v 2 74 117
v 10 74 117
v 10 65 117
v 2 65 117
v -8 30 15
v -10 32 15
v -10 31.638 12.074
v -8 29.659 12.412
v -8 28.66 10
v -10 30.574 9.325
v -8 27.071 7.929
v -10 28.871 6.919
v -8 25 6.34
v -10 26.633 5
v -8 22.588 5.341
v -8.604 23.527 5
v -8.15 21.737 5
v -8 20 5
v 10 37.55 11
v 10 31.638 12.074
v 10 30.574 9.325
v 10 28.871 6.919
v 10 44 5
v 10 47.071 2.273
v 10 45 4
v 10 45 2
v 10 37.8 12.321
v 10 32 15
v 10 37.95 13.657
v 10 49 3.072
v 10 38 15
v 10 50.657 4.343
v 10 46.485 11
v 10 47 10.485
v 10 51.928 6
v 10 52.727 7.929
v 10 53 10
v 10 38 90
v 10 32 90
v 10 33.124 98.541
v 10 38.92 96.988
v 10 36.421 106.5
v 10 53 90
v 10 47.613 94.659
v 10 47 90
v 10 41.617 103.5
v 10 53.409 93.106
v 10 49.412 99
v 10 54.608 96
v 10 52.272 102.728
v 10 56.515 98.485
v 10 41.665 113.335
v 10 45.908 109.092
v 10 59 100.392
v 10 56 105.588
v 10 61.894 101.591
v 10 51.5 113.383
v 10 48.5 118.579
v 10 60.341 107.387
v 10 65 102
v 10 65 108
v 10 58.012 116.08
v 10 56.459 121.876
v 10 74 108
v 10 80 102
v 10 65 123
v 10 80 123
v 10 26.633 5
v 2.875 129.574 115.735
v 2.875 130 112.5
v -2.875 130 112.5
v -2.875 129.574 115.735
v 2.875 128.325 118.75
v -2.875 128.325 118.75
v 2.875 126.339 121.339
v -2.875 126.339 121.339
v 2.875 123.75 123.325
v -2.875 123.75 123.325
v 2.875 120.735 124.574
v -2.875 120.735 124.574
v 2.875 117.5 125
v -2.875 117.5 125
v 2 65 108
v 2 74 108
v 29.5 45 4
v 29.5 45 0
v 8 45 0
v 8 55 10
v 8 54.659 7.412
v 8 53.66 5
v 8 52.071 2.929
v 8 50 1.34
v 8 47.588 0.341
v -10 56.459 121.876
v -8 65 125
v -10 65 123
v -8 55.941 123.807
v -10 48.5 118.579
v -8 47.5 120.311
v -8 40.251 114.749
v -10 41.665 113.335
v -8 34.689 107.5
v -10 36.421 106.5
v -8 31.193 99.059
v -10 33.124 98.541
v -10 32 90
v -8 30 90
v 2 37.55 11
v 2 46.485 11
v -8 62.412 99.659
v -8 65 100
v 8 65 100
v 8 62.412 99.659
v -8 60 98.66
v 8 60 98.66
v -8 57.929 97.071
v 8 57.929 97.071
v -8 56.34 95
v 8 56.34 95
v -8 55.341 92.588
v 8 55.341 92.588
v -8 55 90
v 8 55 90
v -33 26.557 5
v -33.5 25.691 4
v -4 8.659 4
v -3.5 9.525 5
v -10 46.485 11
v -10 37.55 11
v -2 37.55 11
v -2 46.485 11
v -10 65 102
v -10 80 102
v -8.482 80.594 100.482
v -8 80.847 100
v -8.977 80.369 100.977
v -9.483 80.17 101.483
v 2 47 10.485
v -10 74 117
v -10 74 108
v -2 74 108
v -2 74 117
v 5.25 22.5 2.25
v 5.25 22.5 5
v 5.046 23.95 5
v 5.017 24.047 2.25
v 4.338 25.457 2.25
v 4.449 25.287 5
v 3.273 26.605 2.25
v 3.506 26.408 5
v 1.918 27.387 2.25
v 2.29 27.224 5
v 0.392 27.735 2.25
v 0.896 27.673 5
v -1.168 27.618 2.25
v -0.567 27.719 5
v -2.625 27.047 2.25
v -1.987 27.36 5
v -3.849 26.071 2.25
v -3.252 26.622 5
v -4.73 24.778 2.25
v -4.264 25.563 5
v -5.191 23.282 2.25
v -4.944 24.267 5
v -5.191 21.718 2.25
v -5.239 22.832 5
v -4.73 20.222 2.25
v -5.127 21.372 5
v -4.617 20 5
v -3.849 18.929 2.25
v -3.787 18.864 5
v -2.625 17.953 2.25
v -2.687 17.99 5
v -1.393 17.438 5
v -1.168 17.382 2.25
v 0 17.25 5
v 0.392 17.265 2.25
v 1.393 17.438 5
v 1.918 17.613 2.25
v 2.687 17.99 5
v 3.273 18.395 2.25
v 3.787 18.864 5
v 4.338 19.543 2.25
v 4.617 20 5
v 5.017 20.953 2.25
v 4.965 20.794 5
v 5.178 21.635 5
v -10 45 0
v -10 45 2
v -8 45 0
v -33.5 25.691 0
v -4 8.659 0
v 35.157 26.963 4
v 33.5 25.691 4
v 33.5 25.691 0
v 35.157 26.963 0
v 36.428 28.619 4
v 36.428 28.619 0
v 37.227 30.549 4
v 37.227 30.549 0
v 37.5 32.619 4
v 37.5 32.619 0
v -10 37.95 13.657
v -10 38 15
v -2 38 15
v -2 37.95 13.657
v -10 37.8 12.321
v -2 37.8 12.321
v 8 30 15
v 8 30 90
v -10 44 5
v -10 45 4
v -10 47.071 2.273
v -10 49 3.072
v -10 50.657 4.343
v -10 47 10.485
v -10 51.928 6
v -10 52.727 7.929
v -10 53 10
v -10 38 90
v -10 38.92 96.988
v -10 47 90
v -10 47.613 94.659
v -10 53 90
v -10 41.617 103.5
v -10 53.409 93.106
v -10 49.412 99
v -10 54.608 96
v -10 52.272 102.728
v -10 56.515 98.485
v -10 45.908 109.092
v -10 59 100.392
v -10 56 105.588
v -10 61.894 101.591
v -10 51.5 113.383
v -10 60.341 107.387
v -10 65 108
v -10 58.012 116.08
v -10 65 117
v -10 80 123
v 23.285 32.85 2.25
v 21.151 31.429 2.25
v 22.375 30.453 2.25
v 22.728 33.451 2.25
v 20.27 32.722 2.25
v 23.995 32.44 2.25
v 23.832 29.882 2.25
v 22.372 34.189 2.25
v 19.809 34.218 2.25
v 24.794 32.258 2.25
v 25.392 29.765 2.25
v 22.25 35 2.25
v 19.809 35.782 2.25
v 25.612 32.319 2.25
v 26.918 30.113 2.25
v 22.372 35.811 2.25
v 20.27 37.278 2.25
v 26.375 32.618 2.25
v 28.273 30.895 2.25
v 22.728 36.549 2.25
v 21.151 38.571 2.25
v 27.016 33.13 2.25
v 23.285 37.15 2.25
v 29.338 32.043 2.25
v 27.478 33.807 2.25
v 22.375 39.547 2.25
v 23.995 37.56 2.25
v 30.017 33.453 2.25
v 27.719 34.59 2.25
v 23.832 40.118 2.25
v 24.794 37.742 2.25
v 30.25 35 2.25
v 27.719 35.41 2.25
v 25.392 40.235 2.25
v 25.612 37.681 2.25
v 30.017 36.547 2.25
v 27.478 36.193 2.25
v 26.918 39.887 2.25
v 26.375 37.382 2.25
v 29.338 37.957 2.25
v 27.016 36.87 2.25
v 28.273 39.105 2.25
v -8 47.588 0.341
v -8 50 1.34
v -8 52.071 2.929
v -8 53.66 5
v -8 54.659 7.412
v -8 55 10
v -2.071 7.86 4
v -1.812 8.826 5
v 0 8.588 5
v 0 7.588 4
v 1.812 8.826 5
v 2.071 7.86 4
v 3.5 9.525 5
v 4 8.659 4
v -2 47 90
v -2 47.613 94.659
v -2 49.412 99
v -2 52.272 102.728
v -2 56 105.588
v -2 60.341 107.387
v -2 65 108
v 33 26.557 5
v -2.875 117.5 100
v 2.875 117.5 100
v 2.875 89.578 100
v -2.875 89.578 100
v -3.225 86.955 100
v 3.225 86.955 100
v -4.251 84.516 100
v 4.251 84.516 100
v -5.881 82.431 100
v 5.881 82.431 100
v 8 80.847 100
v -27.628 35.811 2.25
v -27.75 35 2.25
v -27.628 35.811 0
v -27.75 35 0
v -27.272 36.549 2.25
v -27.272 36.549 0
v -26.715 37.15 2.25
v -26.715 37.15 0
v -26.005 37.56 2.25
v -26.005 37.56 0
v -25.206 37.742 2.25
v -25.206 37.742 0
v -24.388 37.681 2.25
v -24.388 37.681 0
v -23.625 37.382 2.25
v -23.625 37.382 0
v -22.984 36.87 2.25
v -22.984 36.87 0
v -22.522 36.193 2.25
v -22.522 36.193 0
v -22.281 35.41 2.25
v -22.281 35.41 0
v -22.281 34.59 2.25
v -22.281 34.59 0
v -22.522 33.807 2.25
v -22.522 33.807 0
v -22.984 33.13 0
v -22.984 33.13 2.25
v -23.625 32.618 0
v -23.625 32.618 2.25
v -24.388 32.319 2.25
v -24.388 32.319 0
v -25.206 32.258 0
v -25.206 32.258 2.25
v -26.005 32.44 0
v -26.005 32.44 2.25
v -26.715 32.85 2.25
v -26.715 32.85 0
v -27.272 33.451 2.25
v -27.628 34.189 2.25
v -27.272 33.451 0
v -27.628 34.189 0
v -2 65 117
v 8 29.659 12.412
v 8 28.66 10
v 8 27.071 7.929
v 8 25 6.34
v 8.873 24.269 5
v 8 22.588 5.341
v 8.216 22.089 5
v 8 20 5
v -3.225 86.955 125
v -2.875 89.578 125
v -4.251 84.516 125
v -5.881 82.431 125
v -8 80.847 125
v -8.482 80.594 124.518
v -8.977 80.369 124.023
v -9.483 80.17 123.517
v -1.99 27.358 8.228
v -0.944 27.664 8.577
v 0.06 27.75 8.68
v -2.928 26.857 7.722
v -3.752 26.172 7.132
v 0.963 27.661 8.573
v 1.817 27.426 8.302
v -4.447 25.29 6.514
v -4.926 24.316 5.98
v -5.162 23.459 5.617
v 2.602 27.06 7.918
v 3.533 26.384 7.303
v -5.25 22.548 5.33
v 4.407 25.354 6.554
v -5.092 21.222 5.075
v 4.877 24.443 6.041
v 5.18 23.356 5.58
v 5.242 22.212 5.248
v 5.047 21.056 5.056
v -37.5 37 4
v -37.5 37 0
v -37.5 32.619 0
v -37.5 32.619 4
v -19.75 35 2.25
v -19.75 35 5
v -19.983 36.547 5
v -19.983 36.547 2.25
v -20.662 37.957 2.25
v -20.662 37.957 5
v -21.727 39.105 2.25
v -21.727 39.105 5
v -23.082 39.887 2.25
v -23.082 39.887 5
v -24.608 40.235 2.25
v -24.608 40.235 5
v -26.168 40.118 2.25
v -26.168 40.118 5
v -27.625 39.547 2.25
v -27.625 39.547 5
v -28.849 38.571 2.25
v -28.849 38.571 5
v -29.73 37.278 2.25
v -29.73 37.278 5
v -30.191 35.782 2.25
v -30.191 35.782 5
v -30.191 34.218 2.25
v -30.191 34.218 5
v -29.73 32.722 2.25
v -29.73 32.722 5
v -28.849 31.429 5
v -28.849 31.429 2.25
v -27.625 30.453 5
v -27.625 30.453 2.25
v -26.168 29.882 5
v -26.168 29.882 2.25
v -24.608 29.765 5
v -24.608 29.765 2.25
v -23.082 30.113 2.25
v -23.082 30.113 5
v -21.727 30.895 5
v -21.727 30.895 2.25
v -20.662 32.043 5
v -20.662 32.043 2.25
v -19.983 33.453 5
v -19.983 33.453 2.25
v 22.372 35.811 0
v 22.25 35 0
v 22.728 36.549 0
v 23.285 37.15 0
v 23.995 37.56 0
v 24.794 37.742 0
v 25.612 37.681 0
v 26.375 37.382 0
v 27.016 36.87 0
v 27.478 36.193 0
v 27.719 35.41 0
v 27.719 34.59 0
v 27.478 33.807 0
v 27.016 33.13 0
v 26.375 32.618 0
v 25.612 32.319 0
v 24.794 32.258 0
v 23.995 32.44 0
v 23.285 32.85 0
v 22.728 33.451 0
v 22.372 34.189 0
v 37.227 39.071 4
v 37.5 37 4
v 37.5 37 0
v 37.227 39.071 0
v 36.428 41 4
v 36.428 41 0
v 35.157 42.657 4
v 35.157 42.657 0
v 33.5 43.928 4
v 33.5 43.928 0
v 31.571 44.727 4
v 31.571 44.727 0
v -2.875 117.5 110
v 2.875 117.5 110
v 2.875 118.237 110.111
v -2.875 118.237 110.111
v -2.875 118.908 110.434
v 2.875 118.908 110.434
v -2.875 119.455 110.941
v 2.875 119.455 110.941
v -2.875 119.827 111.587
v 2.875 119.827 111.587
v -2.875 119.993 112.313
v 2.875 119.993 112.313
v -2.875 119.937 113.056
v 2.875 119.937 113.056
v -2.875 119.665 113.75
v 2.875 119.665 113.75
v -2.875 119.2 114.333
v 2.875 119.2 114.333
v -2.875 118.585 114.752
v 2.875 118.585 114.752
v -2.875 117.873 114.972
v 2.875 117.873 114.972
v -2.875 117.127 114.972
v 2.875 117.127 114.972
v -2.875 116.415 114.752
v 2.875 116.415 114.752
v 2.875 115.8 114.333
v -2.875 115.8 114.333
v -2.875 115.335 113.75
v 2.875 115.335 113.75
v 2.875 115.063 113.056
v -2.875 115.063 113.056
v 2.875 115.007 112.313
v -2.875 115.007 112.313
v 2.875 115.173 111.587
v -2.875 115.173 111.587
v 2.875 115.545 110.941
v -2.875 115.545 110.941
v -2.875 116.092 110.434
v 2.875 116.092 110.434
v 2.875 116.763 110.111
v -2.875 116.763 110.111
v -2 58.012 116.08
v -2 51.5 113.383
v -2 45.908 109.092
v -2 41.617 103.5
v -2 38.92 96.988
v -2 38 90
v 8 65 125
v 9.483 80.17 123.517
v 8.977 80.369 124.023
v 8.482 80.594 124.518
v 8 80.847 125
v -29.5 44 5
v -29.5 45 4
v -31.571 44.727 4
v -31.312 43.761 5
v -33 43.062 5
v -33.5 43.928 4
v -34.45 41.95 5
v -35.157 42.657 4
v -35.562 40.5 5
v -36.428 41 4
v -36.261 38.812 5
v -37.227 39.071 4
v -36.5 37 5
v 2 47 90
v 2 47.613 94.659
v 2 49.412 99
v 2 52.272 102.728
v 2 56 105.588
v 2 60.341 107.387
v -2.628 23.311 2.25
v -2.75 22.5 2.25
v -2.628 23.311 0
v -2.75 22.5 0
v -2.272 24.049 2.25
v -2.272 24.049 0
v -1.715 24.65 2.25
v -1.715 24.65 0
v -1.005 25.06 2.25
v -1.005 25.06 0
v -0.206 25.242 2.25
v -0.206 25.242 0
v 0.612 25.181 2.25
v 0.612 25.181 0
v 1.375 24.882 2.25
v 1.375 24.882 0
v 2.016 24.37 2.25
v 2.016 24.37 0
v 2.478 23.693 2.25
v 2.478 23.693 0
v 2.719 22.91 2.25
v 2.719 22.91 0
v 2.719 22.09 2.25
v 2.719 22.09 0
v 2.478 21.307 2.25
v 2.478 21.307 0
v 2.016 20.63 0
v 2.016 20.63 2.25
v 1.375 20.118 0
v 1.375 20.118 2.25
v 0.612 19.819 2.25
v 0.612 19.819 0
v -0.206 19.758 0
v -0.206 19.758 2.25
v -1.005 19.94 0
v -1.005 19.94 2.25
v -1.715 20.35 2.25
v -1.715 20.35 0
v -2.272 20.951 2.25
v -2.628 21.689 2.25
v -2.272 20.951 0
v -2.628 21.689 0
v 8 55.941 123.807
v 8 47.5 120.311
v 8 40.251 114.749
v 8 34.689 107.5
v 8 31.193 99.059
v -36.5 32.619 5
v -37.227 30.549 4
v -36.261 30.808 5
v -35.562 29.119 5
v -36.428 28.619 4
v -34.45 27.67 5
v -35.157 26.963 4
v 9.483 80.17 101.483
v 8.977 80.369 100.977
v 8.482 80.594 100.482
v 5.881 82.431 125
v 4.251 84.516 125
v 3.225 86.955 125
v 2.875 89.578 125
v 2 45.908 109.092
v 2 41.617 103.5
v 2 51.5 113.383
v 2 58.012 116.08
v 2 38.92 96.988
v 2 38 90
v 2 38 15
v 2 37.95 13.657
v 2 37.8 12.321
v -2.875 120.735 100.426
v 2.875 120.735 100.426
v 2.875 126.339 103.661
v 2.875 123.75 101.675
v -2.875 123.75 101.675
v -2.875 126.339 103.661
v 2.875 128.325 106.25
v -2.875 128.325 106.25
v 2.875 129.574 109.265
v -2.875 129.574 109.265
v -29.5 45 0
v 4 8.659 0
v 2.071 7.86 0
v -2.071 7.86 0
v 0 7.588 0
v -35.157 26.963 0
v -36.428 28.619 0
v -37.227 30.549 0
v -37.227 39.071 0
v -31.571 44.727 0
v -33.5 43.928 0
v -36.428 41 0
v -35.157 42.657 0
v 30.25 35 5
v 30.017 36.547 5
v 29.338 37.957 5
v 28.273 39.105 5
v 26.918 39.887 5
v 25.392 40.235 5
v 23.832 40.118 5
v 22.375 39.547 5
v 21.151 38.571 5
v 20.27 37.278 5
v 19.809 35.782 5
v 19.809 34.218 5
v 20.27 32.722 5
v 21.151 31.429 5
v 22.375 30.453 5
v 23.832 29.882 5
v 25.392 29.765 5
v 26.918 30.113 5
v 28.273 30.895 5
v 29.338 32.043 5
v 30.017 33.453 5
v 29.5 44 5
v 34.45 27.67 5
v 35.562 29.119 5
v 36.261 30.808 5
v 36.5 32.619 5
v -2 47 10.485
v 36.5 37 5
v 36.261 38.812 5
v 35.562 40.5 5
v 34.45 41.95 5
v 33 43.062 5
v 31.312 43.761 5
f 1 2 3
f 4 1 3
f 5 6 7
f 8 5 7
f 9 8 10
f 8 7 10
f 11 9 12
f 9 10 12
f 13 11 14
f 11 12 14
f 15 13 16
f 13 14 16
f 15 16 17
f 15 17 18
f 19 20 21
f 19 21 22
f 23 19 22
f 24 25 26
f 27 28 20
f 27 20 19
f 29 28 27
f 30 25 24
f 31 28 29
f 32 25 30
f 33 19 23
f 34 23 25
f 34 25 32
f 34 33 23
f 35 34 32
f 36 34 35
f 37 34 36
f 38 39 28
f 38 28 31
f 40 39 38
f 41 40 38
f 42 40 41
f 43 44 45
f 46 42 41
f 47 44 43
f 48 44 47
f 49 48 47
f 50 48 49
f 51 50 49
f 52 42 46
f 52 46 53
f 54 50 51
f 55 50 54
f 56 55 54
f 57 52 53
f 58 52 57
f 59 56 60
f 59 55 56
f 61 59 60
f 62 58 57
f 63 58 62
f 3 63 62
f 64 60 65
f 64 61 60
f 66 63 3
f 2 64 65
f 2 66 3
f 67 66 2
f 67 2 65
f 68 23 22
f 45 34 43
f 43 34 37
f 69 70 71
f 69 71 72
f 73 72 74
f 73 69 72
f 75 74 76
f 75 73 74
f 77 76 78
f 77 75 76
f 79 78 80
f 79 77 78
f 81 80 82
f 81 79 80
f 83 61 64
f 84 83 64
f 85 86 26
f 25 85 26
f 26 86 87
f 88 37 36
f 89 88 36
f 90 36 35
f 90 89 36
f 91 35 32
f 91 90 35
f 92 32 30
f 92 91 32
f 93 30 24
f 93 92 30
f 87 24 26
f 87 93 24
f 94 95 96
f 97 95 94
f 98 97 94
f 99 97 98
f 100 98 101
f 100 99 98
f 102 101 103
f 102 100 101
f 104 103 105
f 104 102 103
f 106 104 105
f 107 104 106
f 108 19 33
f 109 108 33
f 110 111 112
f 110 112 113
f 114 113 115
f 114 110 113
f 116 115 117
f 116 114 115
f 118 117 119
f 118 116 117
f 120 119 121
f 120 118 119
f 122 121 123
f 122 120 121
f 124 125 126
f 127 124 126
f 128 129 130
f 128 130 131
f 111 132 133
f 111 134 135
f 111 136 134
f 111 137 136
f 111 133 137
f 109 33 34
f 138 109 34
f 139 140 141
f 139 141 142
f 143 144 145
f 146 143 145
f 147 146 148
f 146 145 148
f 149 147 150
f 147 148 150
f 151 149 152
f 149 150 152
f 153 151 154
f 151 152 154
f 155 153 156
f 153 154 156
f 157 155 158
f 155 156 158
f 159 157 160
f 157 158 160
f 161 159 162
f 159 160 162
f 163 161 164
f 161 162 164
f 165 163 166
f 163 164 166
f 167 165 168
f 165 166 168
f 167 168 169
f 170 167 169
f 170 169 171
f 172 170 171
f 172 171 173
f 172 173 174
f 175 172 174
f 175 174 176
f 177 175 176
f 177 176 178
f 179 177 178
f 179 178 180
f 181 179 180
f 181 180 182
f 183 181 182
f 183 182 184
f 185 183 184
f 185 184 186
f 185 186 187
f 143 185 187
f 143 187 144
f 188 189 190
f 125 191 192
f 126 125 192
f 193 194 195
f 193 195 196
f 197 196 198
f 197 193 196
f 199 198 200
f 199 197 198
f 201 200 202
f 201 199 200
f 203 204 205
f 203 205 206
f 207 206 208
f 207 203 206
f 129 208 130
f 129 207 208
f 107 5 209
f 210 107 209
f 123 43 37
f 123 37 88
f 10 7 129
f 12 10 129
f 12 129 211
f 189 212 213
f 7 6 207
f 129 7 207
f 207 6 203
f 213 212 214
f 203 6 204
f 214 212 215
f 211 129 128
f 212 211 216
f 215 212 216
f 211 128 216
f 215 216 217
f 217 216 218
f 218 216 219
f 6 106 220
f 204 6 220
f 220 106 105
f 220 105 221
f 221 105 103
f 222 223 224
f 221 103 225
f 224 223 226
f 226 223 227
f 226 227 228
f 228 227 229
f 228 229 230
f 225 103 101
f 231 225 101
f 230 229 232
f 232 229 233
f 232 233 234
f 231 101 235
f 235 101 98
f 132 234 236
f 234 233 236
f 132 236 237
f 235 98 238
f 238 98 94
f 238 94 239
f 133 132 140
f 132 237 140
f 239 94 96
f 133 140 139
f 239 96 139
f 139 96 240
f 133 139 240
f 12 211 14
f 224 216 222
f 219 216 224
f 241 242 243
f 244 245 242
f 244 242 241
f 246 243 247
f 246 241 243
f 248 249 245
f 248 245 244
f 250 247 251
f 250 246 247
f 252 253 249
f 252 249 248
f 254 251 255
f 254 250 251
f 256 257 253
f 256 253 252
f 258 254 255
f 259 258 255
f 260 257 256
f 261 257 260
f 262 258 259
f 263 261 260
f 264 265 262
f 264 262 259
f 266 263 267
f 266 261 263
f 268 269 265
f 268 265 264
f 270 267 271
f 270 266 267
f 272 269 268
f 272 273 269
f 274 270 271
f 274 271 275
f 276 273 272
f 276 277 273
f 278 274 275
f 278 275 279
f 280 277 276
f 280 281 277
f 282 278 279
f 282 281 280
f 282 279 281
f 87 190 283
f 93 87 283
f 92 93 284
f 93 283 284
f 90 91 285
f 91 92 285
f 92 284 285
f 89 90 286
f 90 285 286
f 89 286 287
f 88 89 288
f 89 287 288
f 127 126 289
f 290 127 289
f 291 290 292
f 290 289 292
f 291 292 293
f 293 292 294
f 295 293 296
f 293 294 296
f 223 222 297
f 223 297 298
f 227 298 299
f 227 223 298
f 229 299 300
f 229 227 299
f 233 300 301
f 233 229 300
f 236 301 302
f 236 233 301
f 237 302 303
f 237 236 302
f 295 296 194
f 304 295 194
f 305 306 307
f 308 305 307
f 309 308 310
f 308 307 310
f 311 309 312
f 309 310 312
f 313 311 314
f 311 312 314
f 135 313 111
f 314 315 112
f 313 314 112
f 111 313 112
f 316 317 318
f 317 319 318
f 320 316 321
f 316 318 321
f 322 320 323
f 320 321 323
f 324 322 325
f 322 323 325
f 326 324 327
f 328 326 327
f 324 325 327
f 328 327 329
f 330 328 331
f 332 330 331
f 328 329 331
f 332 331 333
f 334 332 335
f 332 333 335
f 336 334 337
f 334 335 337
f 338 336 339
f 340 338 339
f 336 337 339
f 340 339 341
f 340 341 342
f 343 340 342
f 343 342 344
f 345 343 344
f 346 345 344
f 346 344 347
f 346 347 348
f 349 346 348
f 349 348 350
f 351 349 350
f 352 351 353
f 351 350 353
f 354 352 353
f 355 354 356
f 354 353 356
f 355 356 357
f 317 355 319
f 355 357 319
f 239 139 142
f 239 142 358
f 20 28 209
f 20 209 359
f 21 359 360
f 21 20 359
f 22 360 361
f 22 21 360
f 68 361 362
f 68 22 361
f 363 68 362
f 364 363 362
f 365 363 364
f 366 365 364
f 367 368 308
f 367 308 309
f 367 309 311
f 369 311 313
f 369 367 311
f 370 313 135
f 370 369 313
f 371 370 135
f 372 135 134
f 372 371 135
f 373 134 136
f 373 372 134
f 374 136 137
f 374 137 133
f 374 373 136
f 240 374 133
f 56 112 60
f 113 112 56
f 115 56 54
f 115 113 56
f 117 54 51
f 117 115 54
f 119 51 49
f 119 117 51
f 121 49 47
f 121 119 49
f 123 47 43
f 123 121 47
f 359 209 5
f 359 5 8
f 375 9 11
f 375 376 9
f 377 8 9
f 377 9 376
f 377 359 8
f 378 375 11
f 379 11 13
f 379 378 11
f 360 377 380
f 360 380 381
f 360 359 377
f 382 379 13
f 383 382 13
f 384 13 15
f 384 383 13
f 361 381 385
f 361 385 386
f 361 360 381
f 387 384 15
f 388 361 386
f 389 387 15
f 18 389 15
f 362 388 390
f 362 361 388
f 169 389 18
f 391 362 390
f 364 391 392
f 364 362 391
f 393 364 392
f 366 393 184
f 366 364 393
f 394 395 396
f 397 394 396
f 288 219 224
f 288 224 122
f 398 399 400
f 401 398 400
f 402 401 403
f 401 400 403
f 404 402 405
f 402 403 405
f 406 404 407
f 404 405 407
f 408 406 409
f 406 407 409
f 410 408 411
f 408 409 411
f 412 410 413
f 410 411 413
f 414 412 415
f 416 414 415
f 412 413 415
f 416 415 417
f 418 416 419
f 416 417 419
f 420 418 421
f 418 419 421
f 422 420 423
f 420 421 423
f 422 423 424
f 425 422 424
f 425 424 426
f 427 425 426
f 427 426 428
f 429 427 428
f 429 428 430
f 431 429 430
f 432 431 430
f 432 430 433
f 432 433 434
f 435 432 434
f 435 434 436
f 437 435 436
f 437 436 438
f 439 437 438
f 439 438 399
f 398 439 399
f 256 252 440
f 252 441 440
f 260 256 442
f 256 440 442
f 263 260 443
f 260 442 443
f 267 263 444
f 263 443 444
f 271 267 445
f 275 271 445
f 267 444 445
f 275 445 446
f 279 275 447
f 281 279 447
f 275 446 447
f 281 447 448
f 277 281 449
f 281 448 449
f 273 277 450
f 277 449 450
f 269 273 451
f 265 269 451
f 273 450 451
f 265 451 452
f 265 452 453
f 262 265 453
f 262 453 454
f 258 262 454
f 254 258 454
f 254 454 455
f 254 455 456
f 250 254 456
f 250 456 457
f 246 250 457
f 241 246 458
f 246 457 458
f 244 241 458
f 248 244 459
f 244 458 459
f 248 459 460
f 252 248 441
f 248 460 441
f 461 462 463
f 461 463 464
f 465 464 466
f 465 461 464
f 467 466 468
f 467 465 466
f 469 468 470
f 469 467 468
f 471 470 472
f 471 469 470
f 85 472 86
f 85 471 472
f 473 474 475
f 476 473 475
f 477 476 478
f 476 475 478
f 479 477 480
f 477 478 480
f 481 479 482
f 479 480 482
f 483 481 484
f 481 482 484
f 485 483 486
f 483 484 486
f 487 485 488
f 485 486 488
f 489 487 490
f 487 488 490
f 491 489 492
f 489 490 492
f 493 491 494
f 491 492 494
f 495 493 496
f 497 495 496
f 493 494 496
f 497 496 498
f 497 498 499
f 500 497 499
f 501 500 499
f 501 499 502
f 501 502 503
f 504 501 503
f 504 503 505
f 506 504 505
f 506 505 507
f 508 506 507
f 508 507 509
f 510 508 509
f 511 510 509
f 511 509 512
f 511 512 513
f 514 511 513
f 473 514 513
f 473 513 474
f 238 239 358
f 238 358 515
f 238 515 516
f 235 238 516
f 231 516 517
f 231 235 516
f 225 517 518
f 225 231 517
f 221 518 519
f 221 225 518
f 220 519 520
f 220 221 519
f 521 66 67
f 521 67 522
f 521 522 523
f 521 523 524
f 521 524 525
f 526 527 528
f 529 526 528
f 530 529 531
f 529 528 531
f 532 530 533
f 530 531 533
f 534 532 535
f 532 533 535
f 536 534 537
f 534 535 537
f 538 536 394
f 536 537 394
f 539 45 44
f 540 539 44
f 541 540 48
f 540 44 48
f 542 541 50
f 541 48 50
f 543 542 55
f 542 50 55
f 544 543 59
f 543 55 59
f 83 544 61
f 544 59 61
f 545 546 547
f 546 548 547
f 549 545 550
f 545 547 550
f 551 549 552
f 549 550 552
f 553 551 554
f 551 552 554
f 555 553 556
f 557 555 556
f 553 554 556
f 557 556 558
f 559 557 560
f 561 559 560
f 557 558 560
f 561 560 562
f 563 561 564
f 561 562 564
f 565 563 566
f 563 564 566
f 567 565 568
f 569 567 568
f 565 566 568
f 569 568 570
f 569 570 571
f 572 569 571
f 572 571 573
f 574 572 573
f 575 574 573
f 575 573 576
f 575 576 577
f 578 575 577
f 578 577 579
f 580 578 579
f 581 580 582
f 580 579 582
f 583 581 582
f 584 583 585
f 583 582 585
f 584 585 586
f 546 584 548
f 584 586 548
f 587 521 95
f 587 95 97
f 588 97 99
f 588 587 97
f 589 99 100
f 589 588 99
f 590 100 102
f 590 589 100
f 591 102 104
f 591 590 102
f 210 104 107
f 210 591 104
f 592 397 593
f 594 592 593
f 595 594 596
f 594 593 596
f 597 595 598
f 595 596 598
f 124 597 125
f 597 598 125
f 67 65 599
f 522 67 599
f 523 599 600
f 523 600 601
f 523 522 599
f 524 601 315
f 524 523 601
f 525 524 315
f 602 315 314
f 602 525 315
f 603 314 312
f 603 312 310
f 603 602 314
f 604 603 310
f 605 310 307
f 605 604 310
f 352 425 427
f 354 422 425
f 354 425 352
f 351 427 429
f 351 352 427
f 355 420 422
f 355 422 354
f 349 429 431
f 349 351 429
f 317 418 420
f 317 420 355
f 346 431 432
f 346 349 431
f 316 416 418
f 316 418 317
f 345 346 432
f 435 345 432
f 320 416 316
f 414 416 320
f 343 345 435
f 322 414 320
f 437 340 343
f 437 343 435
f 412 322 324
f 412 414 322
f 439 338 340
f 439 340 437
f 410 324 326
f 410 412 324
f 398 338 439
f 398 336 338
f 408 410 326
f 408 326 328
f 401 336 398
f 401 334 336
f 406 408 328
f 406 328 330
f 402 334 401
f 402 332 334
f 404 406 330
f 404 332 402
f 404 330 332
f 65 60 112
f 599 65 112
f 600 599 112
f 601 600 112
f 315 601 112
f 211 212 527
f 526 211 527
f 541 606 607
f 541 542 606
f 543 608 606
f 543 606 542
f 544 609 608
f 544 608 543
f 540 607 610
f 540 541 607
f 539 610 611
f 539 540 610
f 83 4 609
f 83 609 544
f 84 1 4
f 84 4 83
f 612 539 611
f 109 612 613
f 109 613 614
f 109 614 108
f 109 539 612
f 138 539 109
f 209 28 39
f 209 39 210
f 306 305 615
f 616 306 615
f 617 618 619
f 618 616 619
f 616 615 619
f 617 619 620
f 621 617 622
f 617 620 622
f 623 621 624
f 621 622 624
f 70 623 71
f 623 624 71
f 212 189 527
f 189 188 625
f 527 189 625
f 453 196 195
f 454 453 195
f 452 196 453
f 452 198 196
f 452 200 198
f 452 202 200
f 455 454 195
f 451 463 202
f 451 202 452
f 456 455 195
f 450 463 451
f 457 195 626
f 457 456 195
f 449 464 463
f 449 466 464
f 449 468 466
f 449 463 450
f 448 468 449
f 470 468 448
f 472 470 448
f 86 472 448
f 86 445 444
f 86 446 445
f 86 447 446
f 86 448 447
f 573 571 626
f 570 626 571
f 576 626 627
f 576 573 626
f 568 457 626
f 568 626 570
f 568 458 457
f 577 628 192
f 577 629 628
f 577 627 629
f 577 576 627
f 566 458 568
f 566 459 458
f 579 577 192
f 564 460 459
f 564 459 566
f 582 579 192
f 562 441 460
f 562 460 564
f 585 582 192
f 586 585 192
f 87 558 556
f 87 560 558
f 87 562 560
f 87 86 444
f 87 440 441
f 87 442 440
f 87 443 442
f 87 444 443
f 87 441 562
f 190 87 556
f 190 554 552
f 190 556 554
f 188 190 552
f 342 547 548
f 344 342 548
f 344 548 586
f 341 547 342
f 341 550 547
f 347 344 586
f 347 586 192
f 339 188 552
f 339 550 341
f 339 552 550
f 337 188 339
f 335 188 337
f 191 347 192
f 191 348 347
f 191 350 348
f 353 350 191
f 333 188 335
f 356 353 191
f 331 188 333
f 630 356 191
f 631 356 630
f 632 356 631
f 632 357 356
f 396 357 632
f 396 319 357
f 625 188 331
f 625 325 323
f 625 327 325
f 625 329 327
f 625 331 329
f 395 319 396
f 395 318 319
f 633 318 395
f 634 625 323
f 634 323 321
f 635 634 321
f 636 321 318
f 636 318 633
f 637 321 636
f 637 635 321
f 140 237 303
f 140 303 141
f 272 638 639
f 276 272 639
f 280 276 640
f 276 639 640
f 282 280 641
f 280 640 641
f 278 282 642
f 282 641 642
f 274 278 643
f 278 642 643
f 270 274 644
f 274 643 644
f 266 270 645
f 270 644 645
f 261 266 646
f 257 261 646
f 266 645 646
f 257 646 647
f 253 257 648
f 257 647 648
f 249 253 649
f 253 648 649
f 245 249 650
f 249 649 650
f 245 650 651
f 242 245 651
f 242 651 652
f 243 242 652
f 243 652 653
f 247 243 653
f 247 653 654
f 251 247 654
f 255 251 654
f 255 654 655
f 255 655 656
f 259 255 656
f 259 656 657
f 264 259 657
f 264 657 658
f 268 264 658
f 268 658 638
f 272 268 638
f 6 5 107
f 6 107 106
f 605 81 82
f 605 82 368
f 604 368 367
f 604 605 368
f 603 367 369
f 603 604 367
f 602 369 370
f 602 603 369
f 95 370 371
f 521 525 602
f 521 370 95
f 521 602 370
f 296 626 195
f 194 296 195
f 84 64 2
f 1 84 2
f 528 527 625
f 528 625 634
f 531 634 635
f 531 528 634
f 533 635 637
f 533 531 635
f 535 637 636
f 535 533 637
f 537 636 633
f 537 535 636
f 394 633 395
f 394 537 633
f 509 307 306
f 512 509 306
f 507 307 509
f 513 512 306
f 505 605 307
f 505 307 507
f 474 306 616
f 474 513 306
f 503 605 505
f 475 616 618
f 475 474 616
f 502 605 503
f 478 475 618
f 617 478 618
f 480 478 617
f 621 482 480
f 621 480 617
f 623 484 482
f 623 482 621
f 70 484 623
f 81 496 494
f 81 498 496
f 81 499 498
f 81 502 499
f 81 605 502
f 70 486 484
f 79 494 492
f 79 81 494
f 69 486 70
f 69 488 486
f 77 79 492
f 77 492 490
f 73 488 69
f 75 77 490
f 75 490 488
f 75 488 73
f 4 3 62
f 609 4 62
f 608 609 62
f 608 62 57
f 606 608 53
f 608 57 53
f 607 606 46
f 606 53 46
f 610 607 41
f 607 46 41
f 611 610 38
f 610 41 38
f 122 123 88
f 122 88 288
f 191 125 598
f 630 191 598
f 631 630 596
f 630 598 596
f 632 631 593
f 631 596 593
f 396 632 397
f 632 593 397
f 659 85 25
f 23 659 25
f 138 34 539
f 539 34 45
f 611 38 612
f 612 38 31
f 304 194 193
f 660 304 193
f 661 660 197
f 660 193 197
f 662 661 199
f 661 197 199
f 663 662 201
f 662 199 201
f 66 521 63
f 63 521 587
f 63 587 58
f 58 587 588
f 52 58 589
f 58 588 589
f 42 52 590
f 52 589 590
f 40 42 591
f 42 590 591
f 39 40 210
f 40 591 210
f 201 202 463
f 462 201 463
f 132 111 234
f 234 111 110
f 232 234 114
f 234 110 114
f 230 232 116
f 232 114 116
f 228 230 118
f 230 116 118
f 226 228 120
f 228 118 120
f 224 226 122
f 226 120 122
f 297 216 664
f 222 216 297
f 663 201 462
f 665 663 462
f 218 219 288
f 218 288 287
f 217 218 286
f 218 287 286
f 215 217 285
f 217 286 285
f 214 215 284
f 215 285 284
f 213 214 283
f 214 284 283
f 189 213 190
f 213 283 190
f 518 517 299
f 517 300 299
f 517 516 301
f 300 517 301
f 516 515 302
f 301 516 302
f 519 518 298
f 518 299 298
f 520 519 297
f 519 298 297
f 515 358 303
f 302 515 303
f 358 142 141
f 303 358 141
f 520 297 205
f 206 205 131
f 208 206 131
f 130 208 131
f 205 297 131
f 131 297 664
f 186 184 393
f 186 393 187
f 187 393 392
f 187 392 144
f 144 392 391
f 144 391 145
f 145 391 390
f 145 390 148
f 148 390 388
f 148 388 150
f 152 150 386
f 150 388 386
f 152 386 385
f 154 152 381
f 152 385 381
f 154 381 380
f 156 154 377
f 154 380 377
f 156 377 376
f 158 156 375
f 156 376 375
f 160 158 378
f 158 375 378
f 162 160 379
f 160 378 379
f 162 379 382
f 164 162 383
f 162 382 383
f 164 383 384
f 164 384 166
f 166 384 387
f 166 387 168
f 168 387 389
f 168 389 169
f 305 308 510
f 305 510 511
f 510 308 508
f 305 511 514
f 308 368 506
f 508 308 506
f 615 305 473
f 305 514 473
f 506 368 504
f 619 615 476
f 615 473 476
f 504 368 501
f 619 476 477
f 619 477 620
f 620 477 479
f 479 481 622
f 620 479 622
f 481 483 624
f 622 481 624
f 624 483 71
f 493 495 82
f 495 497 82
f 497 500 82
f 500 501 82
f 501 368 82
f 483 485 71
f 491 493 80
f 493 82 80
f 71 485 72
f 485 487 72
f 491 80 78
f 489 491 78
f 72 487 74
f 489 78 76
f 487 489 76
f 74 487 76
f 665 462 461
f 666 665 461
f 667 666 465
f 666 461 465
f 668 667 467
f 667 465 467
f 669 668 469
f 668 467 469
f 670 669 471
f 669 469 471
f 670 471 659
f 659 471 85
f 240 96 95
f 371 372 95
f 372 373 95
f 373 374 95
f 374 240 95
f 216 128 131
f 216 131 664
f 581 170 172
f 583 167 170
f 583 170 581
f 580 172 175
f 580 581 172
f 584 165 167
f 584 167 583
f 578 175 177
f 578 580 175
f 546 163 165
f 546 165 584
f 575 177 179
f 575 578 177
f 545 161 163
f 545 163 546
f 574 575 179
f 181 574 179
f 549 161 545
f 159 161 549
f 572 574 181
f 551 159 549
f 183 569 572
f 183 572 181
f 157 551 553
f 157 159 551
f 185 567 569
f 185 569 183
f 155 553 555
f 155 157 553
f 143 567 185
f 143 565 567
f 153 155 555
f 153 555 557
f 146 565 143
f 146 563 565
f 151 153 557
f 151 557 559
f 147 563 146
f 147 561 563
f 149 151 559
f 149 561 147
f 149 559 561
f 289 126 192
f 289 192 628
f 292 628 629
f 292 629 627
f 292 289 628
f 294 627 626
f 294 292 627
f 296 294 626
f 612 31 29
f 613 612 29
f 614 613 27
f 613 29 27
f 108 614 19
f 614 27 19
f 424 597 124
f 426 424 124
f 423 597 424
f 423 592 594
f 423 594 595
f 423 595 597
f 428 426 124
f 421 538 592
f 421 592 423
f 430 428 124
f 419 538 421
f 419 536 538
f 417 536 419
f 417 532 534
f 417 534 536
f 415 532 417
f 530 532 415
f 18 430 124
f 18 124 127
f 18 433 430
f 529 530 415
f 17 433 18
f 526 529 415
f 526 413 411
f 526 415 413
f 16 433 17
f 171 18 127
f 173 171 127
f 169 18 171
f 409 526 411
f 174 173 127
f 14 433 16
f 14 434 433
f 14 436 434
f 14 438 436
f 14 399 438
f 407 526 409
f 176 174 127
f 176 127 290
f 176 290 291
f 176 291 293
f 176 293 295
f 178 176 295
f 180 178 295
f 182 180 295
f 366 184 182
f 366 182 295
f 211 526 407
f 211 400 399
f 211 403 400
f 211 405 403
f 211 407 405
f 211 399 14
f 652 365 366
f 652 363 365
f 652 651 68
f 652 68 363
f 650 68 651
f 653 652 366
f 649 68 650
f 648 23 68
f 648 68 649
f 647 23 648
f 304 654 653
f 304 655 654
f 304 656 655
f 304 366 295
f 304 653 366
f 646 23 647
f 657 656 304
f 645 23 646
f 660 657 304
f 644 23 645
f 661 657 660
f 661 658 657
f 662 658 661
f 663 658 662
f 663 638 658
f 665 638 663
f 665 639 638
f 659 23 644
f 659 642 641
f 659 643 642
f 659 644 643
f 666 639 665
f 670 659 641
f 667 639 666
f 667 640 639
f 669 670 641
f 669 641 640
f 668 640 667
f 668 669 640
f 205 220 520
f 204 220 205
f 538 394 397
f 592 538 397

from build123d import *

# Parameters (mm, degrees)
BOSS_EXTRUDE1_DEPTH             = 5
FILLET1_R                       = 8
CBORE_FOR_M5_SBHCS1_D           = 5.5
CBORE_FOR_M5_SBHCS1_DEPTH       = 10
CBORE_FOR_M5_SBHCS1_CBORE_D     = 10.5
CBORE_FOR_M5_SBHCS1_CBORE_DEPTH = 2.75
CBORE_FOR_M5_SBHCS1_TIP         = 1.652366702
SKETCH7_W                       = 20
SKETCH7_H                       = 100
BOSS_EXTRUDE2_DEPTH             = 120
SKETCH8_W                       = 190
SKETCH8_H                       = 150
CUT_EXTRUDE1_DEPTH              = 72
FILLET2_R                       = 12.5
SKETCH9_W                       = 14.25
SKETCH9_H                       = 100
CUT_EXTRUDE2_DEPTH              = 72
SKETCH10_R                      = 2.5
CUT_EXTRUDE3_DEPTH              = 72
FILLET3_R                       = 10
FILLET4_R                       = 10
FILLET5_R                       = 35
FILLET6_R                       = 10
SKETCH12_W                      = 20
SKETCH12_H                      = 10
BOSS_EXTRUDE3_DEPTH             = 5
FILLET7_R                       = 10
CHAMFER1_SIZE                   = 2
CHAMFER2_SIZE                   = 1
CUT_EXTRUDE4_DEPTH              = 8


# Some blends are built 0.0001 mm under size
with BuildPart() as part:
    # Sketch2 → Boss-Extrude1 (new body)
    with BuildSketch(Plane.XY):
        Polygon((-37.5, 28.000635095), (0, 6.35), (37.5, 28.000635095), (37.5, 45), (-37.5, 45), align=None)
    extrude(amount=BOSS_EXTRUDE1_DEPTH)

    # Fillet1
    fillet1_edges = [part.edges().sort_by_distance(p)[0] for p in [
        (37.5, 28.000635095, 2.5),
        (0, 6.35, 2.5),
        (-37.5, 28.000635095, 2.5),
        (-37.5, 45, 2.5),
        (37.5, 45, 2.5),
    ]]
    fillet(fillet1_edges, radius=FILLET1_R)

    # CBORE for M5 SBHCS1
    with Locations(Plane.XY.offset(5)):
        with Locations((-25, 35), (0, 22.5), (25, 35)):
            CounterBoreHole(CBORE_FOR_M5_SBHCS1_D / 2, CBORE_FOR_M5_SBHCS1_CBORE_D / 2, CBORE_FOR_M5_SBHCS1_CBORE_DEPTH, depth=CBORE_FOR_M5_SBHCS1_DEPTH)
            with Locations((0, 0, -(CBORE_FOR_M5_SBHCS1_DEPTH + CBORE_FOR_M5_SBHCS1_TIP / 2))):  # 118° drill point
                Cone(0, CBORE_FOR_M5_SBHCS1_D / 2, CBORE_FOR_M5_SBHCS1_TIP, mode=Mode.SUBTRACT)

    # Sketch7 → Boss-Extrude2 (add)
    with BuildSketch(Plane.XY.offset(5)):
        with Locations((0, 80)):
            Rectangle(SKETCH7_W, SKETCH7_H)
    extrude(amount=BOSS_EXTRUDE2_DEPTH)

    # Sketch8 → Cut-Extrude1 (cut)
    with BuildSketch(Plane(origin=(10, 0, 0), x_dir=(0, 0, -1), z_dir=(1, 0, 0))):
        with Locations((-5, 130)):
            Rectangle(SKETCH8_W, SKETCH8_H)
    extrude(amount=-CUT_EXTRUDE1_DEPTH, mode=Mode.SUBTRACT)

    # Fillet2
    fillet2_edges = [part.edges().sort_by_distance(p)[0] for p in [
        (0, 130, 100),
        (0, 130, 125),
    ]]
    fillet(fillet2_edges, radius=FILLET2_R - 0.0001)  # a hair under: the kernel refuses the full size

    # Sketch9 → Cut-Extrude2 (cut)
    with BuildSketch(Plane.XY.offset(125)):
        with Locations((10, 130)):
            Rectangle(SKETCH9_W, SKETCH9_H)
        with Locations((-10, 130)):
            Rectangle(SKETCH9_W, SKETCH9_H)
    extrude(amount=-CUT_EXTRUDE2_DEPTH, mode=Mode.SUBTRACT)

    # Sketch10 → Cut-Extrude3 (cut)
    with BuildSketch(Plane(origin=(2.875, 0, 0), x_dir=(0, 0, -1), z_dir=(1, 0, 0))):
        with Locations((-112.5, 117.5)):
            Circle(SKETCH10_R)
    extrude(amount=-CUT_EXTRUDE3_DEPTH, mode=Mode.SUBTRACT)

    # Fillet3
    # the kernel refuses this fillet: 10 mm, written as the material it adds along each edge
    with BuildSketch(Plane(origin=(-2.875, 80, 125), x_dir=(-1, 0, 0), z_dir=(0, 0, -1))) as fillet3_piece_1:
        with BuildLine():
            CenterArc((10, 9.577806377), FILLET3_R, 180, 73.291656284)
            Line((0, 9.577806377), (-0.2, 9.577806377))
            Line((-0.2, 9.577806377), (-0.2, 0))
            Line((-0.2, 0), (0, -0.2))
            ThreePointArc((0, -0.2), (3.5625, -0.2), (7.0675, -0.191556128))
            Line((7.0675, -0.191556128), (7.125, 0))
        make_face()
    extrude(amount=25)
    with BuildSketch(Plane(origin=(2.875, 80, 125), x_dir=(0, 1, 0), z_dir=(0, 0, -1))) as fillet3_piece_2:
        with BuildLine():
            CenterArc((9.577806377, 10), FILLET3_R, 196.708343716, 73.291656284)
            Line((0, 7.125), (-0.191556128, 7.0675))
            ThreePointArc((-0.191556128, 7.0675), (-0.2, 3.5625), (-0.2, 0))
            Line((-0.2, 0), (0, -0.2))
            Line((0, -0.2), (9.577806377, -0.2))
            Line((9.577806377, -0.2), (9.577806377, 0))
        make_face()
    extrude(amount=25)

    # Fillet4
    fillet4_edges = [part.edges().sort_by_distance(p)[0] for p in [
        (0, 55, 100),
    ]]
    fillet(fillet4_edges, radius=FILLET4_R)

    # Fillet5
    fillet5_edges = [part.edges().sort_by_distance(p)[0] for p in [
        (0, 30, 125),
    ]]
    fillet(fillet5_edges, radius=FILLET5_R)

    # Fillet6
    # the kernel refuses this fillet: 10 mm, written as the material it adds along each edge
    with BuildSketch(Plane(origin=(10, 30, 5), x_dir=(0, 0, 1), z_dir=(-1, 0, 0))) as fillet6_piece_1_section:
        with BuildLine():
            CenterArc((FILLET6_R, -FILLET6_R), FILLET6_R, 90, 90)
            Line((0, -FILLET6_R), (0, 0))
            Line((0, 0), (FILLET6_R, 0))
        make_face()
    fillet6_piece_1 = extrude(amount=20, mode=Mode.PRIVATE)
    fillet6_piece_1 = fillet6_piece_1 - Plane(origin=(0, 22.5, 7.53044348), x_dir=(1, 0, 0), z_dir=(0, 0, 1)) * Cylinder(5.25, 80, mode=Mode.PRIVATE)
    add(fillet6_piece_1)

    # Sketch12 → Boss-Extrude3 (add)
    with BuildSketch(Plane(origin=(0, 0, 5), x_dir=(-1, 0, 0), z_dir=(0, 0, -1))):
        with Locations((0, 50)):
            Rectangle(SKETCH12_W, SKETCH12_H)
    extrude(amount=BOSS_EXTRUDE3_DEPTH)

    # Fillet7
    # the kernel refuses this fillet: 10 mm, written as the material it takes off along each edge
    with BuildSketch(Plane(origin=(-35, 55, 0), x_dir=(0, 0, 1), z_dir=(1, 0, 0))) as fillet7_piece_1:
        with BuildLine():
            CenterArc((FILLET7_R, FILLET7_R), FILLET7_R, 180, 90)
            Line((0, FILLET7_R), (0, 0))
            Line((0, 0), (FILLET7_R, 0))
        make_face()
    extrude(amount=70, mode=Mode.SUBTRACT)

    # Chamfer1
    # the kernel refuses this chamfer: 2 mm, written as the material it takes off along each edge
    with BuildSketch(Plane(origin=(-10, 65, 100), x_dir=(-0.02749587661058987, 0, 0.9996219169112968), z_dir=(0, 1, 0)), Plane(origin=(10, 85.143365976, 100), x_dir=(0.027495876610586414, 0, 0.9996219169112968), z_dir=(0, -1, 0))) as chamfer1_piece_1:
        Polygon((CHAMFER1_SIZE * 0.999621916911, CHAMFER1_SIZE * 0.0274958766106), (-CHAMFER1_SIZE * 0.0274958766106, CHAMFER1_SIZE * 0.999621916911), (0, 0), align=None)
    extrude(amount=20.143365976, mode=Mode.SUBTRACT)
    with BuildSketch(Plane(origin=(-10, 65, 125), x_dir=(-0.02749587661058987, 0, -0.9996219169112968), z_dir=(0, 1, 0)), Plane(origin=(10, 85.143365976, 125), x_dir=(0.027495876610586414, 0, -0.9996219169112968), z_dir=(0, -1, 0))) as chamfer1_piece_2:
        Polygon((CHAMFER1_SIZE * 0.999621916911, -CHAMFER1_SIZE * 0.0274958766106), (-CHAMFER1_SIZE * 0.0274958766106, -CHAMFER1_SIZE * 0.999621916911), (0, 0), align=None)
    extrude(amount=20.143365976, mode=Mode.SUBTRACT)
    with BuildSketch(Plane(origin=(-10, 55, 10), x_dir=(-0.027495876610589956, -0.9996219169112965, 0), z_dir=(0, 0, 1)), Plane(origin=(10, 55, 90), x_dir=(0.0274958766105822, -0.999621916911297, 0), z_dir=(0, 0, -1))) as chamfer1_piece_3:
        Polygon((CHAMFER1_SIZE * 0.999621916911, CHAMFER1_SIZE * 0.0274958766106), (-CHAMFER1_SIZE * 0.0274958766106, CHAMFER1_SIZE * 0.999621916911), (0, 0), align=None)
    extrude(amount=80, mode=Mode.SUBTRACT)
    with BuildSketch(Plane(origin=(10, 65, 90), x_dir=(0, 0, 1), z_dir=(0, 1, 0))) as chamfer1_piece_4:
        Polygon((10 + CHAMFER1_SIZE, 0), (10, -CHAMFER1_SIZE), (10, 0), align=None)
    revolve(axis=Axis((10, 65, 90), (1, 0, 0)), revolution_arc=90, mode=Mode.SUBTRACT)
    with BuildSketch(Plane(origin=(-10, 65, 90), x_dir=(0, 0, 1), z_dir=(0, 1, 0))) as chamfer1_piece_5:
        Polygon((10 + CHAMFER1_SIZE, 0), (10, CHAMFER1_SIZE), (10, 0), align=None)
    revolve(axis=Axis((-10, 65, 90), (1, 0, 0)), revolution_arc=90, mode=Mode.SUBTRACT)
    with BuildSketch(Plane(origin=(10, 30, 15), x_dir=(0.027495876610581334, 0.999621916911297, 0), z_dir=(0, 0, 1)), Plane(origin=(-10, 30, 15), x_dir=(0.9996219169112968, -0.027495876610585623, 0), z_dir=(0, 0, 1))) as chamfer1_piece_6:
        Polygon((CHAMFER1_SIZE * 0.999621916911, CHAMFER1_SIZE * 0.0274958766106), (-CHAMFER1_SIZE * 0.0274958766106, CHAMFER1_SIZE * 0.999621916911), (0, 0), align=None)
    extrude(amount=75, mode=Mode.SUBTRACT)
    with BuildSketch(Plane(origin=(10, 65, 90), x_dir=(0, 0, 1), z_dir=(0, 1, 0))) as chamfer1_piece_7:
        Polygon((35 - CHAMFER1_SIZE, 0), (35, -CHAMFER1_SIZE), (35, 0), align=None)
    revolve(axis=Axis((10, 65, 90), (1, 0, 0)), revolution_arc=90, mode=Mode.SUBTRACT)
    with BuildSketch(Plane(origin=(-10, 65, 90), x_dir=(0, 0, 1), z_dir=(0, 1, 0))) as chamfer1_piece_8:
        Polygon((35 - CHAMFER1_SIZE, 0), (35, CHAMFER1_SIZE), (35, 0), align=None)
    revolve(axis=Axis((-10, 65, 90), (1, 0, 0)), revolution_arc=90, mode=Mode.SUBTRACT)
    with BuildSketch(Plane(origin=(10, 20, 15), x_dir=(0, 1, 0), z_dir=(0, 0, 1))) as chamfer1_piece_9_section:
        Polygon((10, CHAMFER1_SIZE), (10 + CHAMFER1_SIZE, 0), (10, 0), align=None)
    chamfer1_piece_9 = revolve(axis=Axis((10, 20, 15), (-1, 0, 0)), revolution_arc=119.481154356, mode=Mode.PRIVATE)
    chamfer1_piece_9 = split(chamfer1_piece_9, bisect_by=Plane(origin=(9.27752792, 27.153705444, 5), z_dir=(0, 0, 1)), keep=Keep.TOP, mode=Mode.PRIVATE)
    add(chamfer1_piece_9, mode=Mode.SUBTRACT)
    with BuildSketch(Plane(origin=(-10, 20, 15), x_dir=(0, 1, 0), z_dir=(0, 0, 1))) as chamfer1_piece_10_section:
        Polygon((10, -CHAMFER1_SIZE), (10 + CHAMFER1_SIZE, 0), (10, 0), align=None)
    chamfer1_piece_10 = revolve(axis=Axis((-10, 20, 15), (-1, 0, 0)), revolution_arc=119.481154356, mode=Mode.PRIVATE)
    chamfer1_piece_10 = split(chamfer1_piece_10, bisect_by=Plane(origin=(-9.27752792, 27.153705444, 5), z_dir=(0, 0, 1)), keep=Keep.TOP, mode=Mode.PRIVATE)
    add(chamfer1_piece_10, mode=Mode.SUBTRACT)
    with BuildSketch(Plane(origin=(10, 45, 10), x_dir=(0, 1, 0), z_dir=(0, 0, 1))) as chamfer1_piece_11:
        Polygon((10 - CHAMFER1_SIZE, 0), (10, CHAMFER1_SIZE), (10, 0), align=None)
    revolve(axis=Axis((10, 45, 10), (-1, 0, 0)), revolution_arc=90, mode=Mode.SUBTRACT)
    with BuildSketch(Plane(origin=(-10, 45, 10), x_dir=(0, 1, 0), z_dir=(0, 0, 1))) as chamfer1_piece_12:
        Polygon((10 - CHAMFER1_SIZE, 0), (10, -CHAMFER1_SIZE), (10, 0), align=None)
    revolve(axis=Axis((-10, 45, 10), (-1, 0, 0)), revolution_arc=90, mode=Mode.SUBTRACT)

    # Chamfer2
    chamfer2_edges = [part.edges().sort_by_distance(p)[0] for p in [
        (-37.5, 34.809718624, 5),
        (19.75, 45, 5),
        (37.5, 34.809718624, 5),
        (-18.75, 17.175317547, 5),
        (18.75, 17.175317547, 5),
        (35.156854249, 42.656854249, 5),
        (36.42820323, 28.619437248, 5),
        (0, 7.587604307, 5),
        (-36.42820323, 28.619437248, 5),
        (-35.156854249, 42.656854249, 5),
        (-19.75, 45, 5),
    ]]
    chamfer(chamfer2_edges, length=CHAMFER2_SIZE)

    # Sketch13 → Cut-Extrude4 (cut)
    with BuildSketch(Plane(origin=(10, 0, 0), x_dir=(0, 0, -1), z_dir=(1, 0, 0))):
        with BuildLine():
            Line((-11, 37.549928775), (-11, 46.485281374))
            Line((-11, 46.485281374), (-10.485281374, 47))
            Line((-10.485281374, 47), (-90, 47))
            ThreePointArc((-90, 47), (-102.727922061, 52.272077939), (-108, 65))
            Line((-108, 65), (-108, 74))
            Line((-108, 74), (-117, 74))
            Line((-117, 74), (-117, 65))
            ThreePointArc((-117, 65), (-109.091883092, 45.908116908), (-90, 38))
            Line((-90, 38), (-15, 38))
            ThreePointArc((-15, 38), (-12.987379562, 37.887128304), (-11, 37.549928775))
        make_face()
    cut_extrude4 = extrude(amount=-CUT_EXTRUDE4_DEPTH, mode=Mode.SUBTRACT)

    # Mirror1: Cut-Extrude4 across plane
    add(cut_extrude4.mirror(Plane(origin=(0, 0, 0), x_dir=(0, 0, 1), z_dir=(1, 0, 0))), mode=Mode.SUBTRACT)


solid = part.part
